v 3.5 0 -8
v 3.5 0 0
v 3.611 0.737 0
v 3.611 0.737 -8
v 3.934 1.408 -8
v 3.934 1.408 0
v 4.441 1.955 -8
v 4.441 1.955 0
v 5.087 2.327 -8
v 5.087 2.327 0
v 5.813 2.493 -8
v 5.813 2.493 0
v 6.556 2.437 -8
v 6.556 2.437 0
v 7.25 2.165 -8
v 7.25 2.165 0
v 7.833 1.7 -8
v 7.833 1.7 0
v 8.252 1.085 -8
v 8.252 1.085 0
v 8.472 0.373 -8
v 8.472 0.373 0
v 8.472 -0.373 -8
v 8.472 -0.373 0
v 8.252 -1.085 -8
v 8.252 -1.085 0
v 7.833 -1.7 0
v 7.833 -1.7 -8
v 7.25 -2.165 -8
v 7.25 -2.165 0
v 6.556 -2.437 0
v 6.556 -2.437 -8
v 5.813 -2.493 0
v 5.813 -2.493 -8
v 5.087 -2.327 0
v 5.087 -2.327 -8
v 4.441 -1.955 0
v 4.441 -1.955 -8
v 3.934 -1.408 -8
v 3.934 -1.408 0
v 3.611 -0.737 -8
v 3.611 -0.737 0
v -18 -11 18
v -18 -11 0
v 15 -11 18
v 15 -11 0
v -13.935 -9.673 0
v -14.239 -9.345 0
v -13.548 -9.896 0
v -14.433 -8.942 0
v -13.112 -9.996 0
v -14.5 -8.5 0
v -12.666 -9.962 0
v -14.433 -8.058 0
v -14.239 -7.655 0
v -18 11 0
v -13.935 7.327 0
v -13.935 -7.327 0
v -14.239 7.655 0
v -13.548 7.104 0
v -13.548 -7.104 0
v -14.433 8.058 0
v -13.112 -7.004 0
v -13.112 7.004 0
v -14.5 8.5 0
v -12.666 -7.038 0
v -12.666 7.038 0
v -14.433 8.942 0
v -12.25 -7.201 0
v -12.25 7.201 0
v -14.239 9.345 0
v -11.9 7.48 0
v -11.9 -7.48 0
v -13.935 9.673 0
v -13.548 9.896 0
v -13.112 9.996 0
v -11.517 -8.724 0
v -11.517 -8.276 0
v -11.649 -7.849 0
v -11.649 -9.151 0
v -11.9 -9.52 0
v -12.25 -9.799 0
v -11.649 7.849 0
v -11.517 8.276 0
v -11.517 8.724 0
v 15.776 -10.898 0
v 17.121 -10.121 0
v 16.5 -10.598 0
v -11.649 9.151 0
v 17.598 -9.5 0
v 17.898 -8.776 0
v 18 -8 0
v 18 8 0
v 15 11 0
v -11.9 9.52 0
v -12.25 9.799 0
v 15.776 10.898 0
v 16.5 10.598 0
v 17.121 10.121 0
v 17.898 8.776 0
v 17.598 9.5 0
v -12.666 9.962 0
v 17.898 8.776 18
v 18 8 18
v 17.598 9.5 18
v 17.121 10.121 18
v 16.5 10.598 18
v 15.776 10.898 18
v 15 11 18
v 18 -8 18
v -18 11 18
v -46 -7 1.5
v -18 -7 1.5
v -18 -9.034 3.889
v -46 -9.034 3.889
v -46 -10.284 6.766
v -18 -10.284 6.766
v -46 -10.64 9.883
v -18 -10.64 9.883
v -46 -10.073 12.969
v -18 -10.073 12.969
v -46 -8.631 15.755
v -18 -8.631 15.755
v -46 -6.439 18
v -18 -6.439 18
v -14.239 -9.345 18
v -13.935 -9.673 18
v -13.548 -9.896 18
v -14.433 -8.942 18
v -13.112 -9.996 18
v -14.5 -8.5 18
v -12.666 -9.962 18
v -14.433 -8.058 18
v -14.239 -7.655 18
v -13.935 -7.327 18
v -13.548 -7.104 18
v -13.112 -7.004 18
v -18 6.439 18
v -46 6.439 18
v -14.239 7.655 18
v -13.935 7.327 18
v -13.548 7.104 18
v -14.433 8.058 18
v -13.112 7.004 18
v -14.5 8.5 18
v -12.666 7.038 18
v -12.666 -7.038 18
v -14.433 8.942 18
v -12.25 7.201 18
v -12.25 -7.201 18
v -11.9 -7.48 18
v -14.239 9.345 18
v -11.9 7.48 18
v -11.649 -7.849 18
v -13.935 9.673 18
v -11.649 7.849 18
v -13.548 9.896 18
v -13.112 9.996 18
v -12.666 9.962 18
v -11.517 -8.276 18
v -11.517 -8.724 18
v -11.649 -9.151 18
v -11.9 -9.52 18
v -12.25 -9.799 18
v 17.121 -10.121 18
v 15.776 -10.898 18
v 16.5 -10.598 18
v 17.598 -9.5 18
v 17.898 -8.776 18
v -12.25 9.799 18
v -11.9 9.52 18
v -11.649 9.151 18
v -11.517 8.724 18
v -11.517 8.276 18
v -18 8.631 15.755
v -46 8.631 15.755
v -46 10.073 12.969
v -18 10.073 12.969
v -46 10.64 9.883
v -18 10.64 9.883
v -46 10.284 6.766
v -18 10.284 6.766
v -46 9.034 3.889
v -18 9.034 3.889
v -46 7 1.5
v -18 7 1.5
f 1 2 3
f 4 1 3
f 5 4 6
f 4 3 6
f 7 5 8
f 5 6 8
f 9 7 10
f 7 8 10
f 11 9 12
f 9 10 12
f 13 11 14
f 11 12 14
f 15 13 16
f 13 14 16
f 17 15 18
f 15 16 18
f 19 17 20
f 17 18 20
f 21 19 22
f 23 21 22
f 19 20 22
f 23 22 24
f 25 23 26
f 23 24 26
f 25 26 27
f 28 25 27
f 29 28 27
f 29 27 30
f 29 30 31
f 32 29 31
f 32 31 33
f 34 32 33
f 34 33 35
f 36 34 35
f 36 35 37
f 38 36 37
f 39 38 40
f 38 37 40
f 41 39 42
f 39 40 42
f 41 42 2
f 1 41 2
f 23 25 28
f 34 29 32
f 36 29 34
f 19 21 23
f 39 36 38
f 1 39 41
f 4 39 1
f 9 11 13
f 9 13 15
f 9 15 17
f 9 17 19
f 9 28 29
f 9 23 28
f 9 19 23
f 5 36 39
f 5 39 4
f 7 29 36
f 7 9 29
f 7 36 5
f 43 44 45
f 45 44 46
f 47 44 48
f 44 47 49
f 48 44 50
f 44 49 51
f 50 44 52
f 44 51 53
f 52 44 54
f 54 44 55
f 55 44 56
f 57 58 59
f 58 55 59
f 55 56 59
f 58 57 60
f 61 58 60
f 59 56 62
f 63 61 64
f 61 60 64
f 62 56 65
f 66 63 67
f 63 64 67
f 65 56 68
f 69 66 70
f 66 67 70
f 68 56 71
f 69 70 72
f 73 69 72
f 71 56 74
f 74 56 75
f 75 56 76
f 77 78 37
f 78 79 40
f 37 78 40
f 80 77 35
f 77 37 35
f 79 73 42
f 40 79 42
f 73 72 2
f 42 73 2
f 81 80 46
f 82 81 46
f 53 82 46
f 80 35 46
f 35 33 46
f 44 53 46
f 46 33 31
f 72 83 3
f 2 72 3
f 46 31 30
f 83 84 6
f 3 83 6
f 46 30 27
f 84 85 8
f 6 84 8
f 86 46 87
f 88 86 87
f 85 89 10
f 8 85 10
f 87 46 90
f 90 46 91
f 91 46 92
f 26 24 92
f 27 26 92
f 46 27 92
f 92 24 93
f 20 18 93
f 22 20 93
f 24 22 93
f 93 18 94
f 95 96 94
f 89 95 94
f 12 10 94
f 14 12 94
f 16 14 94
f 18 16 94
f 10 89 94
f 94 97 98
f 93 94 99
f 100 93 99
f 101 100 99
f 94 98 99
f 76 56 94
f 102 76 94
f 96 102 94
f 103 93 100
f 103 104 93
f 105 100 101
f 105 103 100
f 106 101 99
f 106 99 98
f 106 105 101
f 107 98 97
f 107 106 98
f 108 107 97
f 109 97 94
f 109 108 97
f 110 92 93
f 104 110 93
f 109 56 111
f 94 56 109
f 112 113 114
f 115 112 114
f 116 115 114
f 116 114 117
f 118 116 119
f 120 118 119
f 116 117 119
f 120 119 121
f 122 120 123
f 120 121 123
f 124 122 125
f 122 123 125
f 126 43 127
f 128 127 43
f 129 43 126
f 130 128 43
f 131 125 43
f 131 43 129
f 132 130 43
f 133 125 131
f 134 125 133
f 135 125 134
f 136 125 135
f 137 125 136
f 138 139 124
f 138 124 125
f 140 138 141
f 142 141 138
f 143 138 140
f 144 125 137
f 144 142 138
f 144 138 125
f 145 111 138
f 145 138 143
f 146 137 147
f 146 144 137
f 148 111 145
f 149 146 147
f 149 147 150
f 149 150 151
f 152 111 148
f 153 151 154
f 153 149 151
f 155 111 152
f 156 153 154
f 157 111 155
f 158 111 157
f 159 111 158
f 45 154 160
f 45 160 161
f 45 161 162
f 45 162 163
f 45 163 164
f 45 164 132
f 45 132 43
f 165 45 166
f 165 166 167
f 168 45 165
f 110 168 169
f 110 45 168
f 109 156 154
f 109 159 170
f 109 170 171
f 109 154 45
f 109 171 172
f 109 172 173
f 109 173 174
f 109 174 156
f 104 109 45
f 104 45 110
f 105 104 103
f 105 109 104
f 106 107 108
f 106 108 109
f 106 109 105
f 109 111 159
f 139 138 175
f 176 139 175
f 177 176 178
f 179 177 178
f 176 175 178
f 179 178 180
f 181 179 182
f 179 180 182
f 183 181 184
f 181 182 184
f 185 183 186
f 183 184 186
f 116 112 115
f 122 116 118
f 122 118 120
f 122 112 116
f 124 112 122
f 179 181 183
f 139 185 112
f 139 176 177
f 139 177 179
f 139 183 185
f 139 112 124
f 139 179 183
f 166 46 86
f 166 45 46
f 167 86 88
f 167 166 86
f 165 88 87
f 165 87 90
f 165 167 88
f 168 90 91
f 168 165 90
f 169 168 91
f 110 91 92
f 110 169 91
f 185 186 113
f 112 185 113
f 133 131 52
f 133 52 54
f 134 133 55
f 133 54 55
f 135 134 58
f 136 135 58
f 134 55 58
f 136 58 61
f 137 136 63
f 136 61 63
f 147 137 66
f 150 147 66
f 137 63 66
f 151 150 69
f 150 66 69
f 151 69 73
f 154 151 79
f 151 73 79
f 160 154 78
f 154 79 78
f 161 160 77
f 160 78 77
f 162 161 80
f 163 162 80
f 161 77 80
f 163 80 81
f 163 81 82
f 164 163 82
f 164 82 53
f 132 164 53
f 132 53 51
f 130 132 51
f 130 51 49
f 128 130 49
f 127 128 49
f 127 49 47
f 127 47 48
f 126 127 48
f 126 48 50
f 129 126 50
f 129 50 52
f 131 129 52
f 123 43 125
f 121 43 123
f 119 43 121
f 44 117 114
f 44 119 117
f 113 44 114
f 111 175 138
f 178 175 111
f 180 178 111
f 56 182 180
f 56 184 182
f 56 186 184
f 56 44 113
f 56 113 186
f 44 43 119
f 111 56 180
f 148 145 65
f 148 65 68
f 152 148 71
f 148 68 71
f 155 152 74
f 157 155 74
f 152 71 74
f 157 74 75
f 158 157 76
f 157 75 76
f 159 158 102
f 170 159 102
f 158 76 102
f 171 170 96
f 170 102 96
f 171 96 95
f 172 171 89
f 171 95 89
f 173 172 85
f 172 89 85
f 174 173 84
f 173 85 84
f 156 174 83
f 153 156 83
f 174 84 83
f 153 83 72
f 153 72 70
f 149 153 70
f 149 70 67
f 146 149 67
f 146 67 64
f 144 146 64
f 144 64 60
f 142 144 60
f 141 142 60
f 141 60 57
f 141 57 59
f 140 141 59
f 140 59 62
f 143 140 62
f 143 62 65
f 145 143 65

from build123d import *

# Parameters (mm, degrees)
SCHIZZO1_W                   = 36
SCHIZZO1_H                   = 22
ESTRUSIONE_ESTRUSIONE1_DEPTH = 18
RACCORDO1_R                  = 3
ESTRUSIONE_ESTRUSIONE2_DEPTH = 28
SCHIZZO3_R                   = 2.5
ESTRUSIONE_ESTRUSIONE3_DEPTH = 8
SCHIZZO3_4_R                 = 1.5
TAGLIO_ESTRUSIONE1_DEPTH     = 19


with BuildPart() as part:
    # Schizzo1 → Estrusione-Estrusione1 (new body)
    with BuildSketch(Plane.XY):
        Rectangle(SCHIZZO1_W, SCHIZZO1_H)
    extrude(amount=ESTRUSIONE_ESTRUSIONE1_DEPTH)

    # Raccordo1
    raccordo1_edges = [part.edges().sort_by_distance(p)[0] for p in [
        (18, 11, 9),
        (18, -11, 9),
    ]]
    fillet(raccordo1_edges, radius=RACCORDO1_R)

    # Schizzo2 → Estrusione-Estrusione2 (add)
    with BuildSketch(Plane.ZY.offset(18)):
        with BuildLine():
            Line((1.5, 7), (1.5, -7))
            ThreePointArc((1.5, -7), (9.883293707, -10.640228974), (18, -6.439043509))
            Line((18, -6.439043509), (18, 6.439043509))
            ThreePointArc((18, 6.439043509), (9.883293707, 10.640228974), (1.5, 7))
        make_face()
    extrude(amount=ESTRUSIONE_ESTRUSIONE2_DEPTH)

    # Schizzo3 → Estrusione-Estrusione3 (add)
    with BuildSketch(Plane(origin=(0, 0, 0), x_dir=(-1, 0, 0), z_dir=(0, 0, -1))):
        with Locations((-6, 0)):
            Circle(SCHIZZO3_R)
    extrude(amount=ESTRUSIONE_ESTRUSIONE3_DEPTH)

    # Schizzo3<4> → Taglio-Estrusione1 (cut, through all)
    with BuildSketch(Plane(origin=(0, 0, 0), x_dir=(-1, 0, 0), z_dir=(0, 0, -1))):
        with Locations((13, 8.5)):
            Circle(SCHIZZO3_4_R)
        with Locations((13, -8.5)):
            Circle(SCHIZZO3_4_R)
    extrude(amount=-TAGLIO_ESTRUSIONE1_DEPTH, mode=Mode.SUBTRACT)


solid = part.part
